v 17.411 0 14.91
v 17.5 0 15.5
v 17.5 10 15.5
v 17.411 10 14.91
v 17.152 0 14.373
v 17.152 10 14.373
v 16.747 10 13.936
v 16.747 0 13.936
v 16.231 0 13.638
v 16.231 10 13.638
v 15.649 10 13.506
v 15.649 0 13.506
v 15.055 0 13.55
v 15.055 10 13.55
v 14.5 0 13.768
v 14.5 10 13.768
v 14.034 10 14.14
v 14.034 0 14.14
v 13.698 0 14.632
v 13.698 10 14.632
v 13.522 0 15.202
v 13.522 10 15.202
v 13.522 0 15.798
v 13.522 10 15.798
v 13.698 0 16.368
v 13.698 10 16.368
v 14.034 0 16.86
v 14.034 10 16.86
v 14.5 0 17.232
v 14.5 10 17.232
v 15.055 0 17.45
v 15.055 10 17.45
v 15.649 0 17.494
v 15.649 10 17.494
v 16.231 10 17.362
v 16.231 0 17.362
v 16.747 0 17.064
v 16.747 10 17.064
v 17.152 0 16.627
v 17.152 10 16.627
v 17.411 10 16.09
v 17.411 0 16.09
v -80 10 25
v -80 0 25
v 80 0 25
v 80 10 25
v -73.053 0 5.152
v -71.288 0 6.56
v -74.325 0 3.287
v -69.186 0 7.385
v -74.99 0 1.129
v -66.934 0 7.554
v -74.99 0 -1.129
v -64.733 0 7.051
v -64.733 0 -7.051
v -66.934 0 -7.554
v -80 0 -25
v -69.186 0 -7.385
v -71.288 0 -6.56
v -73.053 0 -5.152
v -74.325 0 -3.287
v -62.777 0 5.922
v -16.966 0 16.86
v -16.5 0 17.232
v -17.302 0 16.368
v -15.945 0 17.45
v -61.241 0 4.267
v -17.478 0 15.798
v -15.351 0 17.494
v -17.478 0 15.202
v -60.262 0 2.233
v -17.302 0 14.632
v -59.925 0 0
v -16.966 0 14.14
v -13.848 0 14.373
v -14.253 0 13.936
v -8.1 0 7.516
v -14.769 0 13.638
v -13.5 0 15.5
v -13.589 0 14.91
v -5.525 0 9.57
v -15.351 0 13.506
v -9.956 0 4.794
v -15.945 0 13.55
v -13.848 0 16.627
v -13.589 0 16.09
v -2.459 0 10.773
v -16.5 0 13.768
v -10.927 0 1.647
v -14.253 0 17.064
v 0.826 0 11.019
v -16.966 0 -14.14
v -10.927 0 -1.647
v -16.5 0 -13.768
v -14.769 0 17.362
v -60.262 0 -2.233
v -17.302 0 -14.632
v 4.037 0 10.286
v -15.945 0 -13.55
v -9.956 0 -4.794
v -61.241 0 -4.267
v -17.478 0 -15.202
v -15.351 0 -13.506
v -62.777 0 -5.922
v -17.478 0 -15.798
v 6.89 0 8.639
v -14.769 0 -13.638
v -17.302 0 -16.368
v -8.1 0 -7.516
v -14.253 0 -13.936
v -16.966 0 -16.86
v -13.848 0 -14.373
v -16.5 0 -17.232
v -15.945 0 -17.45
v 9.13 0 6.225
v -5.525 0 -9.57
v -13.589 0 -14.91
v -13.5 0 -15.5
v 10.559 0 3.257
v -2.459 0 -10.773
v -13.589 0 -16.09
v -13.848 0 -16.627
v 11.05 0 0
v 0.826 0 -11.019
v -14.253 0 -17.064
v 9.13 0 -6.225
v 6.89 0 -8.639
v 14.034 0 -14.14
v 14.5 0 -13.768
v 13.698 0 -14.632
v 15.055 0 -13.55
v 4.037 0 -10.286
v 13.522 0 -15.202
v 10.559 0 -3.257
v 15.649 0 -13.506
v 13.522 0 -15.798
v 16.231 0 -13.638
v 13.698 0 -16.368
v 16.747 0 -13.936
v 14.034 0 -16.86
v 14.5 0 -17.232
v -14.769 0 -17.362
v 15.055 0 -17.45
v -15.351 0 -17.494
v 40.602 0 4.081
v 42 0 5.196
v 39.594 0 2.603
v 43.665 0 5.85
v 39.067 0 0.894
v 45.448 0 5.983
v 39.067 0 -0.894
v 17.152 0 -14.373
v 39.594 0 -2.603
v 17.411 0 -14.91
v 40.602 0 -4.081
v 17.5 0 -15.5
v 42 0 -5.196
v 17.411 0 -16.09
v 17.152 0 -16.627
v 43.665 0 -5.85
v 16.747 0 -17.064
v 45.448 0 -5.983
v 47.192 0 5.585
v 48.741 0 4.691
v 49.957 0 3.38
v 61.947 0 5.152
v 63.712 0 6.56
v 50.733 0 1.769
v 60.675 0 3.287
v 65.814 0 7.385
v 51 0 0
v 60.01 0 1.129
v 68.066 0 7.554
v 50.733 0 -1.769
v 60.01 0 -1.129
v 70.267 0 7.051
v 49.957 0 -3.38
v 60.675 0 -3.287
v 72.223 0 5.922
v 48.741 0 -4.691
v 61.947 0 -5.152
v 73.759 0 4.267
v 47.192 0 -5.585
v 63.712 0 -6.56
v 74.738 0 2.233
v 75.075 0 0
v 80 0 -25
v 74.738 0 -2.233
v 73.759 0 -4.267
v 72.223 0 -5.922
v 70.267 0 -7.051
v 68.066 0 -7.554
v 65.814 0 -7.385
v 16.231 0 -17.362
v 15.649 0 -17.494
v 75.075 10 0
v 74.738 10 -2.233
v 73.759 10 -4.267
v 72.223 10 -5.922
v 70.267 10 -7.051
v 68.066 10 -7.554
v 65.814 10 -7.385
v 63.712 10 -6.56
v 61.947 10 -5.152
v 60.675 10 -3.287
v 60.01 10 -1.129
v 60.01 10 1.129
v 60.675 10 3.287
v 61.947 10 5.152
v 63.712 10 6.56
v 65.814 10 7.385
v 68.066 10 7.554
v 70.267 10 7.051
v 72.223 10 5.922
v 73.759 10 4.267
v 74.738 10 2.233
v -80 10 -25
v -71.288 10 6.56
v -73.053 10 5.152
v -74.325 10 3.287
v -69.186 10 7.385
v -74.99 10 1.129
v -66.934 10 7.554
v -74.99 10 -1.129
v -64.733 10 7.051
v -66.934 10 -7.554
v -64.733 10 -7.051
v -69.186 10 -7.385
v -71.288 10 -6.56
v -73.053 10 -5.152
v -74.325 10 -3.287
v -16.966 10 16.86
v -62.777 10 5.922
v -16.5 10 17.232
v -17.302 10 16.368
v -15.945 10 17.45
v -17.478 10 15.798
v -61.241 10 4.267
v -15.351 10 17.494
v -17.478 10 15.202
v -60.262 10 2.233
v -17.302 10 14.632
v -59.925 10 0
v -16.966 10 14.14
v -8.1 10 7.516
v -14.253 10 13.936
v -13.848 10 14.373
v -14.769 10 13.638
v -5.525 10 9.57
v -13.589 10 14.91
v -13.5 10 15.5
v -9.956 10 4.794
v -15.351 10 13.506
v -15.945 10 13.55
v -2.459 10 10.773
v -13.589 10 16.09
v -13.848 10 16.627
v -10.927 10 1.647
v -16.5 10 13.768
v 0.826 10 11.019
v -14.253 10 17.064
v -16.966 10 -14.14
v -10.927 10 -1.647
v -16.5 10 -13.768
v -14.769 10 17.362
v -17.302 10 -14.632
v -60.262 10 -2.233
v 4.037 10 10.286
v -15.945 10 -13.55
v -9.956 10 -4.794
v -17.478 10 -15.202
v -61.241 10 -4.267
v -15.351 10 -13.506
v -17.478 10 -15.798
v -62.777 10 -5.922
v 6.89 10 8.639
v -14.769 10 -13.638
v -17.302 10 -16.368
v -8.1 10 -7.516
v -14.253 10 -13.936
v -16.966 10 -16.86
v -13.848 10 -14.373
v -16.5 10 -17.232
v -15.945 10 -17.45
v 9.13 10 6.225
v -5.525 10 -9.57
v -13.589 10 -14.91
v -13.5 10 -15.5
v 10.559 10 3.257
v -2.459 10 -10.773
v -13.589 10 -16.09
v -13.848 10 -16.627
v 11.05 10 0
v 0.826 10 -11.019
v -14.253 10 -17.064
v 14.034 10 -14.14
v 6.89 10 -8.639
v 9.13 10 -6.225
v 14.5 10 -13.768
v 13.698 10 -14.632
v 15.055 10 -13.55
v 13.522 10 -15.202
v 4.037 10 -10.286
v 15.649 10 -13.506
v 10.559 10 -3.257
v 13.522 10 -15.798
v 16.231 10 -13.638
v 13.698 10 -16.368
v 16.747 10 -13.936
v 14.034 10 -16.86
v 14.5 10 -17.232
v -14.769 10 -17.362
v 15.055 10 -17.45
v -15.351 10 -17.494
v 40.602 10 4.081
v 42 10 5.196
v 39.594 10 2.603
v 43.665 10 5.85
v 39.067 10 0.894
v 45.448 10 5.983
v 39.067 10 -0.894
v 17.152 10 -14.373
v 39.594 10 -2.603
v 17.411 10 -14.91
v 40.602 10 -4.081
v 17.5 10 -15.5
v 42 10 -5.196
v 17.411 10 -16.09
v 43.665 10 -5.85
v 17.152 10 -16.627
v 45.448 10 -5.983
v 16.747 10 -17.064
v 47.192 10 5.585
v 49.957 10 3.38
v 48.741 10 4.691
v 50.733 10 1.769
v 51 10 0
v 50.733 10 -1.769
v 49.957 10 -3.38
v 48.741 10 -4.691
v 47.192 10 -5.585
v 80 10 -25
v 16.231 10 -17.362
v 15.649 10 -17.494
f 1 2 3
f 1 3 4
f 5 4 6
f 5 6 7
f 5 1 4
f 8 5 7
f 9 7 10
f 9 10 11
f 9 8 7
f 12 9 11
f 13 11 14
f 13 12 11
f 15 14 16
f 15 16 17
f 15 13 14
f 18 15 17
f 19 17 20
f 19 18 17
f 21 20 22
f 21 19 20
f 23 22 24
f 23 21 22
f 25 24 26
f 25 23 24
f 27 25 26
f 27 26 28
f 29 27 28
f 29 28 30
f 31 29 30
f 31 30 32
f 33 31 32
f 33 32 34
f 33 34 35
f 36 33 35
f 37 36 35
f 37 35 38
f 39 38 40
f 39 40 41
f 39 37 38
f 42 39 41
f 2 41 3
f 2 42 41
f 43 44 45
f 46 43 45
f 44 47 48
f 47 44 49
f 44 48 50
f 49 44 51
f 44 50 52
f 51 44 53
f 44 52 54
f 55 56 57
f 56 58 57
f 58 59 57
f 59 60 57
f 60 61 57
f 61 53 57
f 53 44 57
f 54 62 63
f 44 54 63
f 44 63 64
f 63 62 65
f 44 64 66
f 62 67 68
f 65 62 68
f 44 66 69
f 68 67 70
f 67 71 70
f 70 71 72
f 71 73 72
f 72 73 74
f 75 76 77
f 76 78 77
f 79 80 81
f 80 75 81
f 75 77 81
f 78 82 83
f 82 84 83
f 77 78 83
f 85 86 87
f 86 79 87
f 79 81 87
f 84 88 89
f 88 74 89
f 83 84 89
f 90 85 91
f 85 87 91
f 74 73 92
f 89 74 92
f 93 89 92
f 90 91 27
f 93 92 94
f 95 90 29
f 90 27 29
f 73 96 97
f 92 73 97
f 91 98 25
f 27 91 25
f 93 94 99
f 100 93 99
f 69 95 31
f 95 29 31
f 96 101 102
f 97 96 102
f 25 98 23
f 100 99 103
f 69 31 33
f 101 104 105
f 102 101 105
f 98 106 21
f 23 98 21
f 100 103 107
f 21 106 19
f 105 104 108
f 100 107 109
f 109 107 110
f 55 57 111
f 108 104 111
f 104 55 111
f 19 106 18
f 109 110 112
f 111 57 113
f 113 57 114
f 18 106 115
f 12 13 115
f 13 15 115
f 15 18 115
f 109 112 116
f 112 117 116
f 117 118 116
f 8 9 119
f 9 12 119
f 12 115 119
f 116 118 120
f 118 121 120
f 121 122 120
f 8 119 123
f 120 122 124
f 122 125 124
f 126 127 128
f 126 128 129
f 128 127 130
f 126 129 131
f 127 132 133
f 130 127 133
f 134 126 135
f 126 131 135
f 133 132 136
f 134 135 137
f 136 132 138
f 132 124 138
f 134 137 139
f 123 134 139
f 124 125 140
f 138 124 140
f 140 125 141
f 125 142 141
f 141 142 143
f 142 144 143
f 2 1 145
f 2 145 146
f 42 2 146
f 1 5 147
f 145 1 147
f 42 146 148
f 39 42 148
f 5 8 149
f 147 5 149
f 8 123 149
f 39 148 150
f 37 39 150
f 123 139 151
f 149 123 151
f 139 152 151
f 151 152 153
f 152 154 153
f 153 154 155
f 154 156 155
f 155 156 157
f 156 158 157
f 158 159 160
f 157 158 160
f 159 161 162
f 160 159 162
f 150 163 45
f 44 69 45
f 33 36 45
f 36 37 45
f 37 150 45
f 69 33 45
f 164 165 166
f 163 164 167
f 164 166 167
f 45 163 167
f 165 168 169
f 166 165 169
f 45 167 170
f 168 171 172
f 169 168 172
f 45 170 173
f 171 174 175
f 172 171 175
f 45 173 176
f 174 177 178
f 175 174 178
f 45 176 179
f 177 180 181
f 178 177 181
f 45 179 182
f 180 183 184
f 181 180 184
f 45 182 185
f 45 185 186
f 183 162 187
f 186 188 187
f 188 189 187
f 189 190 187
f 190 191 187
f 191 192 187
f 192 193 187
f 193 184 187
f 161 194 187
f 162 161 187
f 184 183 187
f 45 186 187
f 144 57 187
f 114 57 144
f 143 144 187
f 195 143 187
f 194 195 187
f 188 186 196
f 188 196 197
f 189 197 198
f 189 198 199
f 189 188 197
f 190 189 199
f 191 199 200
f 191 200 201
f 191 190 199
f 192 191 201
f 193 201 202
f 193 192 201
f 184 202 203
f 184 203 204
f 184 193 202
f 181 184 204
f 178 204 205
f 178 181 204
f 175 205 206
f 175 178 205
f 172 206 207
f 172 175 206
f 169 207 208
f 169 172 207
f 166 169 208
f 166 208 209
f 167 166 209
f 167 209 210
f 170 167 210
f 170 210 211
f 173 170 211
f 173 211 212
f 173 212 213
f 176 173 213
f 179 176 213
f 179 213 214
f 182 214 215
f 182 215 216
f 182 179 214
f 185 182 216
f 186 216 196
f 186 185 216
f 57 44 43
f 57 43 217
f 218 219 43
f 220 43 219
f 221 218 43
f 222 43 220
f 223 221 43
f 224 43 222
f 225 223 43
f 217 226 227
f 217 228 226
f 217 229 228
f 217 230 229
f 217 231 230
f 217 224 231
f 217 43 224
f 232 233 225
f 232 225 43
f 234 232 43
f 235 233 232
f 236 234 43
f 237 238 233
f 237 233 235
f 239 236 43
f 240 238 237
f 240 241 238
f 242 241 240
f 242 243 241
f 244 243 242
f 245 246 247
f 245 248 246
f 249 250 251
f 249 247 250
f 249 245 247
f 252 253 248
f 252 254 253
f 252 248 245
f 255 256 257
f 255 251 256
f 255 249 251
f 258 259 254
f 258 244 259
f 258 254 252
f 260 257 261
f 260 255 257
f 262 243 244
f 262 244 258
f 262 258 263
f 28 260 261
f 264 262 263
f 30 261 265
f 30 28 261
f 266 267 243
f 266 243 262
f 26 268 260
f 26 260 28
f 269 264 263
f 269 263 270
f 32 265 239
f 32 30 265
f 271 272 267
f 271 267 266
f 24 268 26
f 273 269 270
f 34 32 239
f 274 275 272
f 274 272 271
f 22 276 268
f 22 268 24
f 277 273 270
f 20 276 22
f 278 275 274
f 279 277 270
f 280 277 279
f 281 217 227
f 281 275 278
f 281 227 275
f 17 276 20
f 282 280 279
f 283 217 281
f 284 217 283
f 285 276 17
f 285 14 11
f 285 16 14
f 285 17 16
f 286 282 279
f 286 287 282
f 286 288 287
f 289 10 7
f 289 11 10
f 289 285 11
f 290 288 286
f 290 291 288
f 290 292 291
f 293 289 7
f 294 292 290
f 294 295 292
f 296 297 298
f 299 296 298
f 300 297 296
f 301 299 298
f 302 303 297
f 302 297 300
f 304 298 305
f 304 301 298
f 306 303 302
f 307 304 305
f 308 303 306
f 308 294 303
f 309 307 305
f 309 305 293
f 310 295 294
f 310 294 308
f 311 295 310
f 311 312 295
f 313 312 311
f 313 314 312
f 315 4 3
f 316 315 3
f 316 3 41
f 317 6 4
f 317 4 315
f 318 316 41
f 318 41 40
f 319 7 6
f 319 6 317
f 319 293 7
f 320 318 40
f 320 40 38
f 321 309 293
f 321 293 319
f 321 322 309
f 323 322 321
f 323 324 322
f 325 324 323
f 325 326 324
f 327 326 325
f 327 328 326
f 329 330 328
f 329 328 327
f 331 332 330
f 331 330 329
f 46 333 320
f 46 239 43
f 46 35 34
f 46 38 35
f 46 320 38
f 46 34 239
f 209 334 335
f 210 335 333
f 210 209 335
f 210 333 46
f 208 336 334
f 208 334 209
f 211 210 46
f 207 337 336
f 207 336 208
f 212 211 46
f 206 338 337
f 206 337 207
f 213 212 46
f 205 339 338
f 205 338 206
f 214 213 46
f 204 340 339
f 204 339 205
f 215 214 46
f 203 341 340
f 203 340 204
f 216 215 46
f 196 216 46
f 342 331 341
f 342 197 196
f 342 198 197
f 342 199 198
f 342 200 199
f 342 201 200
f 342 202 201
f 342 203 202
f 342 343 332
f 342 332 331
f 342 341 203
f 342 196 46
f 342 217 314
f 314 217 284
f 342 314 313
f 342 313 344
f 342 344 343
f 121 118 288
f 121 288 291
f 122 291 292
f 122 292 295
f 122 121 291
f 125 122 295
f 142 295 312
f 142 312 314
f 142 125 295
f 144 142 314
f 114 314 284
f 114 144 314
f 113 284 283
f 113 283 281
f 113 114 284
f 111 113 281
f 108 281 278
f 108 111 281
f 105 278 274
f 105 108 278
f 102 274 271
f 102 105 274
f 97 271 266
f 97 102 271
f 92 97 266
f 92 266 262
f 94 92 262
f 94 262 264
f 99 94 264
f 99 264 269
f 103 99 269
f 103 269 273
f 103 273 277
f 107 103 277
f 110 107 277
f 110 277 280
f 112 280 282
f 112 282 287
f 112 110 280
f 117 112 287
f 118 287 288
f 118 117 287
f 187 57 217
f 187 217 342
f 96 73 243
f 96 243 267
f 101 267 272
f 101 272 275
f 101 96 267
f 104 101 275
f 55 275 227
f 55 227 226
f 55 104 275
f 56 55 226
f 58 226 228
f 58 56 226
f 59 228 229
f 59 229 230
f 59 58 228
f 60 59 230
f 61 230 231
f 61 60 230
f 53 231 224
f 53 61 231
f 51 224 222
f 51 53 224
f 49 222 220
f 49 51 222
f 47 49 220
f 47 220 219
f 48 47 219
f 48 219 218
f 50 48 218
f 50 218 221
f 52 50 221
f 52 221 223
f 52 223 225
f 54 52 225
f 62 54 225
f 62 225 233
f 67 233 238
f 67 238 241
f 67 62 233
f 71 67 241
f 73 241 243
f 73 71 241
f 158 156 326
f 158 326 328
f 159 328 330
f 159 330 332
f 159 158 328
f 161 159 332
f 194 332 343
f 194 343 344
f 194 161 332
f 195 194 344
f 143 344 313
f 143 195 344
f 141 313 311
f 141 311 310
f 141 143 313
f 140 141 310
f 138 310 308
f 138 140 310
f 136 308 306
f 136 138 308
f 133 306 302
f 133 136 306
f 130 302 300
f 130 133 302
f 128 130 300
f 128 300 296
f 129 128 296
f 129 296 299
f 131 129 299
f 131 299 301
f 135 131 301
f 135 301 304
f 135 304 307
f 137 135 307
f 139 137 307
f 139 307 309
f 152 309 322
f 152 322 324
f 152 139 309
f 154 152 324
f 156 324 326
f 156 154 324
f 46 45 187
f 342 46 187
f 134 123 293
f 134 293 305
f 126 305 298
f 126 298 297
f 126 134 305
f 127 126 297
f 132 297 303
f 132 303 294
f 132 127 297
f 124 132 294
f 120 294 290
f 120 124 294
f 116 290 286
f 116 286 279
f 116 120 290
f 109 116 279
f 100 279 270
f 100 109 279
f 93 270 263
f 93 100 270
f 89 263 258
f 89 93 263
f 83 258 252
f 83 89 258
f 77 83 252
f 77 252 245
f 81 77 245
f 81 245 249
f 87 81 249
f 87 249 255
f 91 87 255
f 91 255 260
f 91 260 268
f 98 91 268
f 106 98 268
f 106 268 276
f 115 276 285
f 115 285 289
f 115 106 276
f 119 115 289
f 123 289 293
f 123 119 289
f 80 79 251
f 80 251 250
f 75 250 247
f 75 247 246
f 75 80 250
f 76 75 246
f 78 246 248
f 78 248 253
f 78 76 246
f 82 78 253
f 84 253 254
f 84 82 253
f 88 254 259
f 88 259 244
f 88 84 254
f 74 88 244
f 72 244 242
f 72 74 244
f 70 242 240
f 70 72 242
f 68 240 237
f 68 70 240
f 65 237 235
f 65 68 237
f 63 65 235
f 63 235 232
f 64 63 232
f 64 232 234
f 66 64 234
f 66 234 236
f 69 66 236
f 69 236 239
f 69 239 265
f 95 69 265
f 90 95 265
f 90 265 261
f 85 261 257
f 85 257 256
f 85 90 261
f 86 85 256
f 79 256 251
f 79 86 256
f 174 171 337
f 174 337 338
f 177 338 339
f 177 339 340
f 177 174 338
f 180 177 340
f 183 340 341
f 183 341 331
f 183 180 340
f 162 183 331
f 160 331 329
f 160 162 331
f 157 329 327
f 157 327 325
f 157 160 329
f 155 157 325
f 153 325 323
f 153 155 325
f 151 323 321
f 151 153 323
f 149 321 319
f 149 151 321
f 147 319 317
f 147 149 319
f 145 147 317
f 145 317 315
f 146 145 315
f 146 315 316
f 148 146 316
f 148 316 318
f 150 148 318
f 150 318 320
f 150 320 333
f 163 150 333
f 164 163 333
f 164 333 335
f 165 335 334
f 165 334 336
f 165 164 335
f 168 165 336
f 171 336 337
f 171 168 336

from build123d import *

# Parameters (mm, degrees)
SKETCH1_W           = 160
SKETCH1_H           = 50
SKETCH1_R           = 11.05
SKETCH1_R_2         = 2
SKETCH1_R_3         = 7.575
SKETCH1_R_4         = 6
BOSS_EXTRUDE1_DEPTH = 10


with BuildPart() as part:
    # Sketch1 → Boss-Extrude1 (new body)
    with BuildSketch(Plane(origin=(0, 0, 0), x_dir=(1, 0, 0), z_dir=(0, 1, 0))):
        Rectangle(SKETCH1_W, SKETCH1_H)
        Circle(SKETCH1_R, mode=Mode.SUBTRACT)
        with Locations((15.5, 15.5)):
            Circle(SKETCH1_R_2, mode=Mode.SUBTRACT)
        with Locations((-15.5, 15.5)):
            Circle(SKETCH1_R_2, mode=Mode.SUBTRACT)
        with Locations((-15.5, -15.5)):
            Circle(SKETCH1_R_2, mode=Mode.SUBTRACT)
        with Locations((15.5, -15.5)):
            Circle(SKETCH1_R_2, mode=Mode.SUBTRACT)
        with Locations((-67.5, 0)):
            Circle(SKETCH1_R_3, mode=Mode.SUBTRACT)
        with Locations((67.5, 0)):
            Circle(SKETCH1_R_3, mode=Mode.SUBTRACT)
        with Locations((45, 0)):
            Circle(SKETCH1_R_4, mode=Mode.SUBTRACT)
    extrude(amount=BOSS_EXTRUDE1_DEPTH)


solid = part.part
